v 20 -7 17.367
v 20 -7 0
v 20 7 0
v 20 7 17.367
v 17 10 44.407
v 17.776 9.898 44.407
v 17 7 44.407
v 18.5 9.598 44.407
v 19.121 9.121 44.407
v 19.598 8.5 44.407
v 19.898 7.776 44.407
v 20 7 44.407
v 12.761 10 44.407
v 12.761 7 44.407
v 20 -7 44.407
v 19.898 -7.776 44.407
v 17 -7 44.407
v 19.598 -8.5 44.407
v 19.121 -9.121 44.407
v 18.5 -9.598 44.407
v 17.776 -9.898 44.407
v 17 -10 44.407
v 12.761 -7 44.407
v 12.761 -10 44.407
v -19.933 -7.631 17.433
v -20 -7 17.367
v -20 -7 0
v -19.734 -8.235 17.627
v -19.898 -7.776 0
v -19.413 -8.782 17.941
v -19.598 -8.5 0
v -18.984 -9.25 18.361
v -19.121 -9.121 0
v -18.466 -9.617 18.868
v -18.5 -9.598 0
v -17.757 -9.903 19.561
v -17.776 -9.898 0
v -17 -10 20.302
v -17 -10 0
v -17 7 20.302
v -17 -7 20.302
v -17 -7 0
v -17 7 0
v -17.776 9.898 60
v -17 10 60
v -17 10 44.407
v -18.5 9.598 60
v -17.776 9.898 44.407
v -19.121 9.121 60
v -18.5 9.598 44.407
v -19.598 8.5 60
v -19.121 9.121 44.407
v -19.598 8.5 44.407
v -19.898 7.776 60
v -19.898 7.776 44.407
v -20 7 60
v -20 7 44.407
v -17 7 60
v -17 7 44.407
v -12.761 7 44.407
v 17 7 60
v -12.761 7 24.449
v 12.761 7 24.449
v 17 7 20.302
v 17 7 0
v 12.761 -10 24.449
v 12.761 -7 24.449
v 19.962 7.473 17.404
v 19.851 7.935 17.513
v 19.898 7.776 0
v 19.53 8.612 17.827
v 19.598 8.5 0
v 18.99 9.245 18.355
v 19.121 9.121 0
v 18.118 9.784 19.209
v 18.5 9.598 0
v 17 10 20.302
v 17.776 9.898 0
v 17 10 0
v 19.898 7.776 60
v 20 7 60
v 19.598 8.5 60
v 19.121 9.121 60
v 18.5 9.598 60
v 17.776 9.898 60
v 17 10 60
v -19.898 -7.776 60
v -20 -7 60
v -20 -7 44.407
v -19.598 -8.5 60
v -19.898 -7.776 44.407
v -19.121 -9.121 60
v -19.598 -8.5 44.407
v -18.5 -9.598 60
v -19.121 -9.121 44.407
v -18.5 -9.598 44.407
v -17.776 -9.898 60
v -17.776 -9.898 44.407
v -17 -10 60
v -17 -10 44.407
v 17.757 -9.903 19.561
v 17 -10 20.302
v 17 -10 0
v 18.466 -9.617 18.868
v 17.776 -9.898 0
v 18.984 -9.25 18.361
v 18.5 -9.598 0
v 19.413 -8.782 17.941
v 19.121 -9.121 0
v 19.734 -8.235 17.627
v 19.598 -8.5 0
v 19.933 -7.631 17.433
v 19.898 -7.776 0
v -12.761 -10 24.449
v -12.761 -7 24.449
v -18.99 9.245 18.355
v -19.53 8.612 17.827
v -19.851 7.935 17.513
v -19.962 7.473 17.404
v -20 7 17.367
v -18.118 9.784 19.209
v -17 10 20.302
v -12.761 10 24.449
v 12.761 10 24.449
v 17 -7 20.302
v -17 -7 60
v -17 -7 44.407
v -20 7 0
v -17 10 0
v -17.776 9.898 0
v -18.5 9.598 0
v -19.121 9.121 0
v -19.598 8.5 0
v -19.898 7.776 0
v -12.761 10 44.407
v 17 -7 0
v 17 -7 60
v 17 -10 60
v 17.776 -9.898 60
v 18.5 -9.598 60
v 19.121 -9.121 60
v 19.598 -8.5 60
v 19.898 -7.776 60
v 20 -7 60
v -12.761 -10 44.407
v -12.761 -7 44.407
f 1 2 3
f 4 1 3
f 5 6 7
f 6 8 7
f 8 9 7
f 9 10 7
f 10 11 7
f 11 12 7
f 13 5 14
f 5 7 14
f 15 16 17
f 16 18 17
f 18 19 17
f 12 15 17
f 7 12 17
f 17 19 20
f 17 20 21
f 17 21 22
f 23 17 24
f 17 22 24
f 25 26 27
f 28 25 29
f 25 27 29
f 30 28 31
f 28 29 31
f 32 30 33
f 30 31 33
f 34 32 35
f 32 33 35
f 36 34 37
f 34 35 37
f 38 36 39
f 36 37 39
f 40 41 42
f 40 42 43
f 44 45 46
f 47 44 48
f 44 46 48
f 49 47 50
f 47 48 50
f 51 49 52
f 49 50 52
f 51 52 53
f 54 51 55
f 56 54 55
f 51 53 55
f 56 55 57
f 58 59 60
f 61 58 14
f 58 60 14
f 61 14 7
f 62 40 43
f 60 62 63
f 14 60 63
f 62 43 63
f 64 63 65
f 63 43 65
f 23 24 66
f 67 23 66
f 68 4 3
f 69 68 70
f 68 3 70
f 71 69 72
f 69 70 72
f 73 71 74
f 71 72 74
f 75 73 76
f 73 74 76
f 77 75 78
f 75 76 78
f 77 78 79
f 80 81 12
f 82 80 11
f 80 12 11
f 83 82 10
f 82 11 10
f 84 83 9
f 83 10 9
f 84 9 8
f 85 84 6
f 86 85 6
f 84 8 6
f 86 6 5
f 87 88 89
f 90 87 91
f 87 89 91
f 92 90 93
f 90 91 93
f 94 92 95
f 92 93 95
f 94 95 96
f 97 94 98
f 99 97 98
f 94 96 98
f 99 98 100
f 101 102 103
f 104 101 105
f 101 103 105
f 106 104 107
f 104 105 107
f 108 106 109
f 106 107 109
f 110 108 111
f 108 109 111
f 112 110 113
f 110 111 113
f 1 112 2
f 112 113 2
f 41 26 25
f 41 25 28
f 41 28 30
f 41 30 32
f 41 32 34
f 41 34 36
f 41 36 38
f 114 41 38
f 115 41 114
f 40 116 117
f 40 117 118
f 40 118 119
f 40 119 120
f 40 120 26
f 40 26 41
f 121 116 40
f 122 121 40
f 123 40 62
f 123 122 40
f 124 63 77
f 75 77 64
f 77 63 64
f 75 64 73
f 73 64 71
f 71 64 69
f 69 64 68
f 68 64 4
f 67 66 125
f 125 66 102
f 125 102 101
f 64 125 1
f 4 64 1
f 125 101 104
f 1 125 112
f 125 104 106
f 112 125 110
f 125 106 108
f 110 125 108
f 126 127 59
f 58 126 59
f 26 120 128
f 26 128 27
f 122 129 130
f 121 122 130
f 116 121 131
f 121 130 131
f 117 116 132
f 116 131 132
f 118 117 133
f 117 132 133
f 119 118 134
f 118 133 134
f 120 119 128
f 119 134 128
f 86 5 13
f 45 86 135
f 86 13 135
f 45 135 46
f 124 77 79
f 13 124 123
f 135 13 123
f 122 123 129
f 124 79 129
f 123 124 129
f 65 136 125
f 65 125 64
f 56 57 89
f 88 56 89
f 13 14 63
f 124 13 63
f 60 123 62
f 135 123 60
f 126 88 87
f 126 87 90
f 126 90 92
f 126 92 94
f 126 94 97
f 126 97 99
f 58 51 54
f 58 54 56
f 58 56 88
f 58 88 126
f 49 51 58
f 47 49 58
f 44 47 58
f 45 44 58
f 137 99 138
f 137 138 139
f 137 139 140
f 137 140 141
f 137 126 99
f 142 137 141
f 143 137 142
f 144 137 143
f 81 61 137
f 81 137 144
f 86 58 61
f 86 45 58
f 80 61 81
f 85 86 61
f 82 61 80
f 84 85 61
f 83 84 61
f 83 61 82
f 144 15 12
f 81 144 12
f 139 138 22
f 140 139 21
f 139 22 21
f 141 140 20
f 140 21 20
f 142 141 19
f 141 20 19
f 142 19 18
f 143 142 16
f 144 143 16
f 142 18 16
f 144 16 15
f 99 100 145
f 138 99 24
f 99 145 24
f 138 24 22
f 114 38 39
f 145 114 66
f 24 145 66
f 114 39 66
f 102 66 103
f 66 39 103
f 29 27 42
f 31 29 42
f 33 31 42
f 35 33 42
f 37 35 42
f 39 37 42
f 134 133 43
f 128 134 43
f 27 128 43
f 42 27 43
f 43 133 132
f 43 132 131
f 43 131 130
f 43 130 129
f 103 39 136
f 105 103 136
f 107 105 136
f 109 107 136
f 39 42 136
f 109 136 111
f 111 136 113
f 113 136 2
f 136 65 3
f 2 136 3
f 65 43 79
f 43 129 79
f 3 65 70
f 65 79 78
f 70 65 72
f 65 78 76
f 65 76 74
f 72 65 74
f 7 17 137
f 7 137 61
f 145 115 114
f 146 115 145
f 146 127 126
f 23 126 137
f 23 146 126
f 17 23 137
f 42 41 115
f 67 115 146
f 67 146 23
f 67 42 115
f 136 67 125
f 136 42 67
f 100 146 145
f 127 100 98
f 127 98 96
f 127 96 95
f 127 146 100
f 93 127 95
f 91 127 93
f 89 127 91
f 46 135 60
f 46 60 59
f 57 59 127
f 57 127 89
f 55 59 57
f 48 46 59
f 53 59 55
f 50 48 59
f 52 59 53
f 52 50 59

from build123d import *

# Parameters (mm, degrees)
F0_W     = 34
F0_H     = 14
F1_DEPTH = 60
F3_DEPTH = 12.5


with BuildPart() as f1:
    # F0 (on Top) → F1 (new body)
    with BuildSketch(Plane.XY):
        with BuildLine():
            Line((-17, -10), (17, -10))
            ThreePointArc((17, -10), (19.12132, -9.12132), (20, -7))
            Line((20, -7), (20, 7))
            ThreePointArc((20, 7), (19.12132, 9.12132), (17, 10))
            Line((17, 10), (-17, 10))
            ThreePointArc((-17, 10), (-19.12132, 9.12132), (-20, 7))
            Line((-20, 7), (-20, -7))
            ThreePointArc((-20, -7), (-19.12132, -9.12132), (-17, -10))
        make_face()
        Rectangle(F0_W, F0_H, mode=Mode.SUBTRACT)
    extrude(amount=F1_DEPTH)

    # F2 (on Front) → F3 (cut, symmetric)
    with BuildSketch(Plane.XZ):
        Polygon((-25.043013, 44.406913), (-22.849802, 14.579257), (-12.761037, 24.448702), (-12.761037, 44.406913), align=None)
        Polygon((22.849802, 14.579257), (25.043013, 44.406913), (12.761037, 44.406913), (12.761037, 24.448702), align=None)
    extrude(amount=F3_DEPTH, both=True, mode=Mode.SUBTRACT)


solid = f1.part
